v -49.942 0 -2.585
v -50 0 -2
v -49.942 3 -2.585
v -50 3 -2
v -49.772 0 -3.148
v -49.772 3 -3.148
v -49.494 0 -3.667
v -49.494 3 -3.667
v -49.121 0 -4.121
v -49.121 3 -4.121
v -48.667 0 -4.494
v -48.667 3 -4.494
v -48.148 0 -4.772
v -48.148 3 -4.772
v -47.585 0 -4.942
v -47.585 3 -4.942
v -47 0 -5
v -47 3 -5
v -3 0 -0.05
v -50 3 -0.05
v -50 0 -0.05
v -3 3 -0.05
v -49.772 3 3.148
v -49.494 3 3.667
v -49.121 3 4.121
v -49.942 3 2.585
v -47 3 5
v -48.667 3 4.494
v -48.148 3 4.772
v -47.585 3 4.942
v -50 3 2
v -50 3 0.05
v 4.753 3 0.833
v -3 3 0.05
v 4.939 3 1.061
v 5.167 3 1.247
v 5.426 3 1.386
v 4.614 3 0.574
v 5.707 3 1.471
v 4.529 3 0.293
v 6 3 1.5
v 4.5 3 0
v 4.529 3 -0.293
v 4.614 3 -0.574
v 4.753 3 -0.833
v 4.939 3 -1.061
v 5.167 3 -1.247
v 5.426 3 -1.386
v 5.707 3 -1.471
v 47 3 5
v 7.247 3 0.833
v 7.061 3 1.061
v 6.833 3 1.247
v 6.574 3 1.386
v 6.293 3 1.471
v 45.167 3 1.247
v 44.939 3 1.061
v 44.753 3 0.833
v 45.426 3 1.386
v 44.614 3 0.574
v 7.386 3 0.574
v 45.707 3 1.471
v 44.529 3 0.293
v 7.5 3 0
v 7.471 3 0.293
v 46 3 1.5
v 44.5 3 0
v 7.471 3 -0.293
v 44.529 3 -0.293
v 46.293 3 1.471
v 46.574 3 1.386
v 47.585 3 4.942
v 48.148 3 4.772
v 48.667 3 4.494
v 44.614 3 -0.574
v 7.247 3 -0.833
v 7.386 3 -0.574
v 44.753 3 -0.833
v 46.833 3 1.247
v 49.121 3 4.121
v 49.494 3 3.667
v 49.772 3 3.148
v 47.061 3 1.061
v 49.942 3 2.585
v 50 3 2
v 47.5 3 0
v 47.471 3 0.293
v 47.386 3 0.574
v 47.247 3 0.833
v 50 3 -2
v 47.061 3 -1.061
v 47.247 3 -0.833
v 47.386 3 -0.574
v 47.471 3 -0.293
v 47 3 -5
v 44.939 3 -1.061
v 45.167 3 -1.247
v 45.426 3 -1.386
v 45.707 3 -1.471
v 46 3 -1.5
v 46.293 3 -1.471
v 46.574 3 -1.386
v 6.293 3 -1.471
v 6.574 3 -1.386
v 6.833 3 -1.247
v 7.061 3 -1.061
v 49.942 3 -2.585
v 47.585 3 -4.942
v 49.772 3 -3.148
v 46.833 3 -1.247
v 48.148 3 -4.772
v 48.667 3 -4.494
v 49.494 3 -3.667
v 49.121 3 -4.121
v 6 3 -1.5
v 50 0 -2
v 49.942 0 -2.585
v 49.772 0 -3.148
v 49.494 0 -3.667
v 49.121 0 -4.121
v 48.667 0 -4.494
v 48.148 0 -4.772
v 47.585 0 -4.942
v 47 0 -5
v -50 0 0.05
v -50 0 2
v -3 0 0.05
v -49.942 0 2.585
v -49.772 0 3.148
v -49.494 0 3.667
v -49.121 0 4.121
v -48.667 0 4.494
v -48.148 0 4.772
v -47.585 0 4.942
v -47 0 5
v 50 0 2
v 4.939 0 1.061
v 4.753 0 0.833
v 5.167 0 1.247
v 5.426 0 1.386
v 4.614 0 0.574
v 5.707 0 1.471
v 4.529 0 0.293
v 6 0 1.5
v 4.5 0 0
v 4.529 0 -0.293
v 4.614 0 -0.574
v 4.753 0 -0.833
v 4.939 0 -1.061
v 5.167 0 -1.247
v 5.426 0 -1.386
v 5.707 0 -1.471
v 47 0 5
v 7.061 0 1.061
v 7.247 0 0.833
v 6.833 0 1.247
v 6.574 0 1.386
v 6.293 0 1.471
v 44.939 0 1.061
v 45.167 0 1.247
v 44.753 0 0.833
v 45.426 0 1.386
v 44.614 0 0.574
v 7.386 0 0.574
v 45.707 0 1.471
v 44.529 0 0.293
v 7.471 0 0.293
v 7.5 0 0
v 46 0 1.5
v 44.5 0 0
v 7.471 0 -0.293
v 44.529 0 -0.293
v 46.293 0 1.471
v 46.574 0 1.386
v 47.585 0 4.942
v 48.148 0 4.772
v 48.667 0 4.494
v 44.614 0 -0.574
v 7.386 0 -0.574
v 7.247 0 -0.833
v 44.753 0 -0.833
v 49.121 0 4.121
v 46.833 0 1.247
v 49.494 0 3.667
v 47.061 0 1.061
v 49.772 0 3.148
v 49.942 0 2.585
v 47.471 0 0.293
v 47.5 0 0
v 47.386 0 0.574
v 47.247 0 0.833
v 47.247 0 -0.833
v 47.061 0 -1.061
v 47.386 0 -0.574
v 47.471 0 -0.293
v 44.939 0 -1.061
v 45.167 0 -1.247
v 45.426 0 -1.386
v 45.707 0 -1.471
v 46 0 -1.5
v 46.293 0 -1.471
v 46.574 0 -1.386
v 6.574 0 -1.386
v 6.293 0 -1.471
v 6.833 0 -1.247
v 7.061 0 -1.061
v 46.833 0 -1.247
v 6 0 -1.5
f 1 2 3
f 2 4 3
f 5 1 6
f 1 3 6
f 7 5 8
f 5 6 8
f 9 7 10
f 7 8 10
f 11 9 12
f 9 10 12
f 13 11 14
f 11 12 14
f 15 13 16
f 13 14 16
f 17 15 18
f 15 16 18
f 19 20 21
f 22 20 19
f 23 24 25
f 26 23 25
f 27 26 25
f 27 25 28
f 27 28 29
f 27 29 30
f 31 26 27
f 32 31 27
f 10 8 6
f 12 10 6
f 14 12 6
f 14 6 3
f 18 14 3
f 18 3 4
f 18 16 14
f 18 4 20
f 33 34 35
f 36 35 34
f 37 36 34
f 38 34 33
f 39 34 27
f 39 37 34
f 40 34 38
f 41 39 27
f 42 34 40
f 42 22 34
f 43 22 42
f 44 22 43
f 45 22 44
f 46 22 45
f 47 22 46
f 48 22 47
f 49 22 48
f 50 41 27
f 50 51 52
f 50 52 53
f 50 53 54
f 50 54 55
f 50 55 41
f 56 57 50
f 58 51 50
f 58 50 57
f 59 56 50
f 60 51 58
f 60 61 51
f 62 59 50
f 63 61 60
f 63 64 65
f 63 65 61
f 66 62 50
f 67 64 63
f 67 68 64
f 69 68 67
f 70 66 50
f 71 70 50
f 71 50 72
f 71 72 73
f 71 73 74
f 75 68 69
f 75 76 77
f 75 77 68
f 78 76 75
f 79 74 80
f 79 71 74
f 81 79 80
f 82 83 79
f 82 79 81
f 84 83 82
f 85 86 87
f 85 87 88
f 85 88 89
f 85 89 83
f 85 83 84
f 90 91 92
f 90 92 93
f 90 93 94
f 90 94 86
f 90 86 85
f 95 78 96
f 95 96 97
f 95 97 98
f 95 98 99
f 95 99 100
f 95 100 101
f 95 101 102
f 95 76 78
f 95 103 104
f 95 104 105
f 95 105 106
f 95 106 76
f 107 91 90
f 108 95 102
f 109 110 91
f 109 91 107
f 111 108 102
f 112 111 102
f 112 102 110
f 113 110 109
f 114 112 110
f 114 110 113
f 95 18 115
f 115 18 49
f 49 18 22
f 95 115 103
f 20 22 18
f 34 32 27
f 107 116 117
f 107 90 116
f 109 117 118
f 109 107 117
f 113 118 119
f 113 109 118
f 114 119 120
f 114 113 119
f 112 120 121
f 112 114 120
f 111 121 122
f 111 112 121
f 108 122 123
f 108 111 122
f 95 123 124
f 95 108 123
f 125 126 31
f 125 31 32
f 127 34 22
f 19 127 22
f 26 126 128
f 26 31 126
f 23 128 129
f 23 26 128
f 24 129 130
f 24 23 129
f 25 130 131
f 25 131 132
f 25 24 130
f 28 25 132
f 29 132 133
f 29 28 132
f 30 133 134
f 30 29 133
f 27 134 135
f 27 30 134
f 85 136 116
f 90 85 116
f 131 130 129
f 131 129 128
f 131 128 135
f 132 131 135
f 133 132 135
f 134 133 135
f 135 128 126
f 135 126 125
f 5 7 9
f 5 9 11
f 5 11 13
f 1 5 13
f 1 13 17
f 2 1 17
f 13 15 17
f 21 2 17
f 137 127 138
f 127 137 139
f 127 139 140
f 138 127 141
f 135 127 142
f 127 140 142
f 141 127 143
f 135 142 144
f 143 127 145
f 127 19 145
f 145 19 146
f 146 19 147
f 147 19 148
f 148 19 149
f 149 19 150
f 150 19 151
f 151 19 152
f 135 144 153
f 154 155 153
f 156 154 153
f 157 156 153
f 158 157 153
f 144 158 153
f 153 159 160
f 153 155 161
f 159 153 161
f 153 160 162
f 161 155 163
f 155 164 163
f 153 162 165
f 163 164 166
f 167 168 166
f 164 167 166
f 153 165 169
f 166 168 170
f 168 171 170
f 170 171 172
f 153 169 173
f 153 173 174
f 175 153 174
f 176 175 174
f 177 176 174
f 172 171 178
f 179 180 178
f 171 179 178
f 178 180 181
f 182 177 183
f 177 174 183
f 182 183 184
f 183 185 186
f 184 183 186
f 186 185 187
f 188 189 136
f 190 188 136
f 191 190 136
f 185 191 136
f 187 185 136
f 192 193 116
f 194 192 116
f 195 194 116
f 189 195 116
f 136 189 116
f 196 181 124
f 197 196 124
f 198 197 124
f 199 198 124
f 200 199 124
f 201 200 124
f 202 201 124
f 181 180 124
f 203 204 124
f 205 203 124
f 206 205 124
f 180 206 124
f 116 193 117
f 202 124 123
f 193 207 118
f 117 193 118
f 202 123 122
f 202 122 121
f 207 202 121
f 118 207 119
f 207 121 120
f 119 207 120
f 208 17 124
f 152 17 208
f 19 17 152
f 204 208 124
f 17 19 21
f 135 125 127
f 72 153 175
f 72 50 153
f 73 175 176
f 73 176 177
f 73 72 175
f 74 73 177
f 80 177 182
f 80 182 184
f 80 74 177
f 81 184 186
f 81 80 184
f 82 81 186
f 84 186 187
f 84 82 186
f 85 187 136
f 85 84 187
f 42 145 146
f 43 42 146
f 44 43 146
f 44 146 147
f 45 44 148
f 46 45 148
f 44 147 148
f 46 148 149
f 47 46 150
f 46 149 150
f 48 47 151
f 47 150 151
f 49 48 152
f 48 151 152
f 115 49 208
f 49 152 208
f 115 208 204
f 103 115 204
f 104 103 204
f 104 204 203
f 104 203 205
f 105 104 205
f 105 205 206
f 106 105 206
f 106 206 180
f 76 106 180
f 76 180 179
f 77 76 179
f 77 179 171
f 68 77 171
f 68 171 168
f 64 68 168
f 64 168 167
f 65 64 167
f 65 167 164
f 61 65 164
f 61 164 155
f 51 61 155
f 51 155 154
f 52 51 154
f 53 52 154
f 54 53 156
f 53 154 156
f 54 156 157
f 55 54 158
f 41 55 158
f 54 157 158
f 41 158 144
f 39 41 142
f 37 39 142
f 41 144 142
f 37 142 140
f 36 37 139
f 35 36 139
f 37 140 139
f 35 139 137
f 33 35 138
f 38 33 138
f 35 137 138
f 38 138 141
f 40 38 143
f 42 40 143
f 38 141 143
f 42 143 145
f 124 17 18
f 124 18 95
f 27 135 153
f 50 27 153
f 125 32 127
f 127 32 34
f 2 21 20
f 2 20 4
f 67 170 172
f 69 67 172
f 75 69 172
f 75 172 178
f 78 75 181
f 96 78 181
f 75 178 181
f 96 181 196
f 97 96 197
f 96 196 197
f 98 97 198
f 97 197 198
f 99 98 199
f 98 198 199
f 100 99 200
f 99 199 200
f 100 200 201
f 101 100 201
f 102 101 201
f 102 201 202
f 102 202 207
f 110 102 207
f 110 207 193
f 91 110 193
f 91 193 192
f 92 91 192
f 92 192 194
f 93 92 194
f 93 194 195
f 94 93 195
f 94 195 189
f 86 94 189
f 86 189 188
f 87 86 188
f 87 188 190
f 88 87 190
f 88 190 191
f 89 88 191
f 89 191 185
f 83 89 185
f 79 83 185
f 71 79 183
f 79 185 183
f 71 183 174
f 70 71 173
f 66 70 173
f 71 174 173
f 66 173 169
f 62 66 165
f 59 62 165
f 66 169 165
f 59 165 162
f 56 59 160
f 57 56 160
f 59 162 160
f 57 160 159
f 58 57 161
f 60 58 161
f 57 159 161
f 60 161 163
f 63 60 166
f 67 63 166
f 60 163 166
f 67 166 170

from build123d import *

# Parameters (mm, degrees)
SKETCH1_W             = 100
SKETCH1_H             = 10
BOSS_EXTRUDE1_DEPTH   = 3
FILLET1_R             = 3
F_3_0MM_DOWEL_HOLE1_D = 3
SKETCH2_W             = 47
SKETCH2_H             = 0.1
CUT_EXTRUDE1_DEPTH    = 10


with BuildPart() as part:
    # Sketch1 → Boss-Extrude1 (new body)
    with BuildSketch(Plane(origin=(0, 0, 0), x_dir=(1, 0, 0), z_dir=(0, 1, 0))):
        Rectangle(SKETCH1_W, SKETCH1_H)
    extrude(amount=BOSS_EXTRUDE1_DEPTH)

    # Fillet1
    fillet1_edges = [part.edges().sort_by_distance(p)[0] for p in [
        (50, 1.5, 5),
        (-50, 1.5, 5),
        (-50, 1.5, -5),
        (50, 1.5, -5),
    ]]
    fillet(fillet1_edges, radius=FILLET1_R)

    # Ø3.0mm Dowel Hole1 (through all)
    with Locations(Plane(origin=(0, 3, 0), x_dir=(1, 0, 0), z_dir=(0, 1, 0))):
        with Locations((46, 0), (6, 0)):
            Hole(F_3_0MM_DOWEL_HOLE1_D / 2)

    # Sketch2 → Cut-Extrude1 (cut)
    with BuildSketch(Plane(origin=(0, 3, 0), x_dir=(1, 0, 0), z_dir=(0, 1, 0))):
        with Locations((-26.5, 0)):
            Rectangle(SKETCH2_W, SKETCH2_H)
    extrude(amount=-CUT_EXTRUDE1_DEPTH, mode=Mode.SUBTRACT)


solid = part.part
